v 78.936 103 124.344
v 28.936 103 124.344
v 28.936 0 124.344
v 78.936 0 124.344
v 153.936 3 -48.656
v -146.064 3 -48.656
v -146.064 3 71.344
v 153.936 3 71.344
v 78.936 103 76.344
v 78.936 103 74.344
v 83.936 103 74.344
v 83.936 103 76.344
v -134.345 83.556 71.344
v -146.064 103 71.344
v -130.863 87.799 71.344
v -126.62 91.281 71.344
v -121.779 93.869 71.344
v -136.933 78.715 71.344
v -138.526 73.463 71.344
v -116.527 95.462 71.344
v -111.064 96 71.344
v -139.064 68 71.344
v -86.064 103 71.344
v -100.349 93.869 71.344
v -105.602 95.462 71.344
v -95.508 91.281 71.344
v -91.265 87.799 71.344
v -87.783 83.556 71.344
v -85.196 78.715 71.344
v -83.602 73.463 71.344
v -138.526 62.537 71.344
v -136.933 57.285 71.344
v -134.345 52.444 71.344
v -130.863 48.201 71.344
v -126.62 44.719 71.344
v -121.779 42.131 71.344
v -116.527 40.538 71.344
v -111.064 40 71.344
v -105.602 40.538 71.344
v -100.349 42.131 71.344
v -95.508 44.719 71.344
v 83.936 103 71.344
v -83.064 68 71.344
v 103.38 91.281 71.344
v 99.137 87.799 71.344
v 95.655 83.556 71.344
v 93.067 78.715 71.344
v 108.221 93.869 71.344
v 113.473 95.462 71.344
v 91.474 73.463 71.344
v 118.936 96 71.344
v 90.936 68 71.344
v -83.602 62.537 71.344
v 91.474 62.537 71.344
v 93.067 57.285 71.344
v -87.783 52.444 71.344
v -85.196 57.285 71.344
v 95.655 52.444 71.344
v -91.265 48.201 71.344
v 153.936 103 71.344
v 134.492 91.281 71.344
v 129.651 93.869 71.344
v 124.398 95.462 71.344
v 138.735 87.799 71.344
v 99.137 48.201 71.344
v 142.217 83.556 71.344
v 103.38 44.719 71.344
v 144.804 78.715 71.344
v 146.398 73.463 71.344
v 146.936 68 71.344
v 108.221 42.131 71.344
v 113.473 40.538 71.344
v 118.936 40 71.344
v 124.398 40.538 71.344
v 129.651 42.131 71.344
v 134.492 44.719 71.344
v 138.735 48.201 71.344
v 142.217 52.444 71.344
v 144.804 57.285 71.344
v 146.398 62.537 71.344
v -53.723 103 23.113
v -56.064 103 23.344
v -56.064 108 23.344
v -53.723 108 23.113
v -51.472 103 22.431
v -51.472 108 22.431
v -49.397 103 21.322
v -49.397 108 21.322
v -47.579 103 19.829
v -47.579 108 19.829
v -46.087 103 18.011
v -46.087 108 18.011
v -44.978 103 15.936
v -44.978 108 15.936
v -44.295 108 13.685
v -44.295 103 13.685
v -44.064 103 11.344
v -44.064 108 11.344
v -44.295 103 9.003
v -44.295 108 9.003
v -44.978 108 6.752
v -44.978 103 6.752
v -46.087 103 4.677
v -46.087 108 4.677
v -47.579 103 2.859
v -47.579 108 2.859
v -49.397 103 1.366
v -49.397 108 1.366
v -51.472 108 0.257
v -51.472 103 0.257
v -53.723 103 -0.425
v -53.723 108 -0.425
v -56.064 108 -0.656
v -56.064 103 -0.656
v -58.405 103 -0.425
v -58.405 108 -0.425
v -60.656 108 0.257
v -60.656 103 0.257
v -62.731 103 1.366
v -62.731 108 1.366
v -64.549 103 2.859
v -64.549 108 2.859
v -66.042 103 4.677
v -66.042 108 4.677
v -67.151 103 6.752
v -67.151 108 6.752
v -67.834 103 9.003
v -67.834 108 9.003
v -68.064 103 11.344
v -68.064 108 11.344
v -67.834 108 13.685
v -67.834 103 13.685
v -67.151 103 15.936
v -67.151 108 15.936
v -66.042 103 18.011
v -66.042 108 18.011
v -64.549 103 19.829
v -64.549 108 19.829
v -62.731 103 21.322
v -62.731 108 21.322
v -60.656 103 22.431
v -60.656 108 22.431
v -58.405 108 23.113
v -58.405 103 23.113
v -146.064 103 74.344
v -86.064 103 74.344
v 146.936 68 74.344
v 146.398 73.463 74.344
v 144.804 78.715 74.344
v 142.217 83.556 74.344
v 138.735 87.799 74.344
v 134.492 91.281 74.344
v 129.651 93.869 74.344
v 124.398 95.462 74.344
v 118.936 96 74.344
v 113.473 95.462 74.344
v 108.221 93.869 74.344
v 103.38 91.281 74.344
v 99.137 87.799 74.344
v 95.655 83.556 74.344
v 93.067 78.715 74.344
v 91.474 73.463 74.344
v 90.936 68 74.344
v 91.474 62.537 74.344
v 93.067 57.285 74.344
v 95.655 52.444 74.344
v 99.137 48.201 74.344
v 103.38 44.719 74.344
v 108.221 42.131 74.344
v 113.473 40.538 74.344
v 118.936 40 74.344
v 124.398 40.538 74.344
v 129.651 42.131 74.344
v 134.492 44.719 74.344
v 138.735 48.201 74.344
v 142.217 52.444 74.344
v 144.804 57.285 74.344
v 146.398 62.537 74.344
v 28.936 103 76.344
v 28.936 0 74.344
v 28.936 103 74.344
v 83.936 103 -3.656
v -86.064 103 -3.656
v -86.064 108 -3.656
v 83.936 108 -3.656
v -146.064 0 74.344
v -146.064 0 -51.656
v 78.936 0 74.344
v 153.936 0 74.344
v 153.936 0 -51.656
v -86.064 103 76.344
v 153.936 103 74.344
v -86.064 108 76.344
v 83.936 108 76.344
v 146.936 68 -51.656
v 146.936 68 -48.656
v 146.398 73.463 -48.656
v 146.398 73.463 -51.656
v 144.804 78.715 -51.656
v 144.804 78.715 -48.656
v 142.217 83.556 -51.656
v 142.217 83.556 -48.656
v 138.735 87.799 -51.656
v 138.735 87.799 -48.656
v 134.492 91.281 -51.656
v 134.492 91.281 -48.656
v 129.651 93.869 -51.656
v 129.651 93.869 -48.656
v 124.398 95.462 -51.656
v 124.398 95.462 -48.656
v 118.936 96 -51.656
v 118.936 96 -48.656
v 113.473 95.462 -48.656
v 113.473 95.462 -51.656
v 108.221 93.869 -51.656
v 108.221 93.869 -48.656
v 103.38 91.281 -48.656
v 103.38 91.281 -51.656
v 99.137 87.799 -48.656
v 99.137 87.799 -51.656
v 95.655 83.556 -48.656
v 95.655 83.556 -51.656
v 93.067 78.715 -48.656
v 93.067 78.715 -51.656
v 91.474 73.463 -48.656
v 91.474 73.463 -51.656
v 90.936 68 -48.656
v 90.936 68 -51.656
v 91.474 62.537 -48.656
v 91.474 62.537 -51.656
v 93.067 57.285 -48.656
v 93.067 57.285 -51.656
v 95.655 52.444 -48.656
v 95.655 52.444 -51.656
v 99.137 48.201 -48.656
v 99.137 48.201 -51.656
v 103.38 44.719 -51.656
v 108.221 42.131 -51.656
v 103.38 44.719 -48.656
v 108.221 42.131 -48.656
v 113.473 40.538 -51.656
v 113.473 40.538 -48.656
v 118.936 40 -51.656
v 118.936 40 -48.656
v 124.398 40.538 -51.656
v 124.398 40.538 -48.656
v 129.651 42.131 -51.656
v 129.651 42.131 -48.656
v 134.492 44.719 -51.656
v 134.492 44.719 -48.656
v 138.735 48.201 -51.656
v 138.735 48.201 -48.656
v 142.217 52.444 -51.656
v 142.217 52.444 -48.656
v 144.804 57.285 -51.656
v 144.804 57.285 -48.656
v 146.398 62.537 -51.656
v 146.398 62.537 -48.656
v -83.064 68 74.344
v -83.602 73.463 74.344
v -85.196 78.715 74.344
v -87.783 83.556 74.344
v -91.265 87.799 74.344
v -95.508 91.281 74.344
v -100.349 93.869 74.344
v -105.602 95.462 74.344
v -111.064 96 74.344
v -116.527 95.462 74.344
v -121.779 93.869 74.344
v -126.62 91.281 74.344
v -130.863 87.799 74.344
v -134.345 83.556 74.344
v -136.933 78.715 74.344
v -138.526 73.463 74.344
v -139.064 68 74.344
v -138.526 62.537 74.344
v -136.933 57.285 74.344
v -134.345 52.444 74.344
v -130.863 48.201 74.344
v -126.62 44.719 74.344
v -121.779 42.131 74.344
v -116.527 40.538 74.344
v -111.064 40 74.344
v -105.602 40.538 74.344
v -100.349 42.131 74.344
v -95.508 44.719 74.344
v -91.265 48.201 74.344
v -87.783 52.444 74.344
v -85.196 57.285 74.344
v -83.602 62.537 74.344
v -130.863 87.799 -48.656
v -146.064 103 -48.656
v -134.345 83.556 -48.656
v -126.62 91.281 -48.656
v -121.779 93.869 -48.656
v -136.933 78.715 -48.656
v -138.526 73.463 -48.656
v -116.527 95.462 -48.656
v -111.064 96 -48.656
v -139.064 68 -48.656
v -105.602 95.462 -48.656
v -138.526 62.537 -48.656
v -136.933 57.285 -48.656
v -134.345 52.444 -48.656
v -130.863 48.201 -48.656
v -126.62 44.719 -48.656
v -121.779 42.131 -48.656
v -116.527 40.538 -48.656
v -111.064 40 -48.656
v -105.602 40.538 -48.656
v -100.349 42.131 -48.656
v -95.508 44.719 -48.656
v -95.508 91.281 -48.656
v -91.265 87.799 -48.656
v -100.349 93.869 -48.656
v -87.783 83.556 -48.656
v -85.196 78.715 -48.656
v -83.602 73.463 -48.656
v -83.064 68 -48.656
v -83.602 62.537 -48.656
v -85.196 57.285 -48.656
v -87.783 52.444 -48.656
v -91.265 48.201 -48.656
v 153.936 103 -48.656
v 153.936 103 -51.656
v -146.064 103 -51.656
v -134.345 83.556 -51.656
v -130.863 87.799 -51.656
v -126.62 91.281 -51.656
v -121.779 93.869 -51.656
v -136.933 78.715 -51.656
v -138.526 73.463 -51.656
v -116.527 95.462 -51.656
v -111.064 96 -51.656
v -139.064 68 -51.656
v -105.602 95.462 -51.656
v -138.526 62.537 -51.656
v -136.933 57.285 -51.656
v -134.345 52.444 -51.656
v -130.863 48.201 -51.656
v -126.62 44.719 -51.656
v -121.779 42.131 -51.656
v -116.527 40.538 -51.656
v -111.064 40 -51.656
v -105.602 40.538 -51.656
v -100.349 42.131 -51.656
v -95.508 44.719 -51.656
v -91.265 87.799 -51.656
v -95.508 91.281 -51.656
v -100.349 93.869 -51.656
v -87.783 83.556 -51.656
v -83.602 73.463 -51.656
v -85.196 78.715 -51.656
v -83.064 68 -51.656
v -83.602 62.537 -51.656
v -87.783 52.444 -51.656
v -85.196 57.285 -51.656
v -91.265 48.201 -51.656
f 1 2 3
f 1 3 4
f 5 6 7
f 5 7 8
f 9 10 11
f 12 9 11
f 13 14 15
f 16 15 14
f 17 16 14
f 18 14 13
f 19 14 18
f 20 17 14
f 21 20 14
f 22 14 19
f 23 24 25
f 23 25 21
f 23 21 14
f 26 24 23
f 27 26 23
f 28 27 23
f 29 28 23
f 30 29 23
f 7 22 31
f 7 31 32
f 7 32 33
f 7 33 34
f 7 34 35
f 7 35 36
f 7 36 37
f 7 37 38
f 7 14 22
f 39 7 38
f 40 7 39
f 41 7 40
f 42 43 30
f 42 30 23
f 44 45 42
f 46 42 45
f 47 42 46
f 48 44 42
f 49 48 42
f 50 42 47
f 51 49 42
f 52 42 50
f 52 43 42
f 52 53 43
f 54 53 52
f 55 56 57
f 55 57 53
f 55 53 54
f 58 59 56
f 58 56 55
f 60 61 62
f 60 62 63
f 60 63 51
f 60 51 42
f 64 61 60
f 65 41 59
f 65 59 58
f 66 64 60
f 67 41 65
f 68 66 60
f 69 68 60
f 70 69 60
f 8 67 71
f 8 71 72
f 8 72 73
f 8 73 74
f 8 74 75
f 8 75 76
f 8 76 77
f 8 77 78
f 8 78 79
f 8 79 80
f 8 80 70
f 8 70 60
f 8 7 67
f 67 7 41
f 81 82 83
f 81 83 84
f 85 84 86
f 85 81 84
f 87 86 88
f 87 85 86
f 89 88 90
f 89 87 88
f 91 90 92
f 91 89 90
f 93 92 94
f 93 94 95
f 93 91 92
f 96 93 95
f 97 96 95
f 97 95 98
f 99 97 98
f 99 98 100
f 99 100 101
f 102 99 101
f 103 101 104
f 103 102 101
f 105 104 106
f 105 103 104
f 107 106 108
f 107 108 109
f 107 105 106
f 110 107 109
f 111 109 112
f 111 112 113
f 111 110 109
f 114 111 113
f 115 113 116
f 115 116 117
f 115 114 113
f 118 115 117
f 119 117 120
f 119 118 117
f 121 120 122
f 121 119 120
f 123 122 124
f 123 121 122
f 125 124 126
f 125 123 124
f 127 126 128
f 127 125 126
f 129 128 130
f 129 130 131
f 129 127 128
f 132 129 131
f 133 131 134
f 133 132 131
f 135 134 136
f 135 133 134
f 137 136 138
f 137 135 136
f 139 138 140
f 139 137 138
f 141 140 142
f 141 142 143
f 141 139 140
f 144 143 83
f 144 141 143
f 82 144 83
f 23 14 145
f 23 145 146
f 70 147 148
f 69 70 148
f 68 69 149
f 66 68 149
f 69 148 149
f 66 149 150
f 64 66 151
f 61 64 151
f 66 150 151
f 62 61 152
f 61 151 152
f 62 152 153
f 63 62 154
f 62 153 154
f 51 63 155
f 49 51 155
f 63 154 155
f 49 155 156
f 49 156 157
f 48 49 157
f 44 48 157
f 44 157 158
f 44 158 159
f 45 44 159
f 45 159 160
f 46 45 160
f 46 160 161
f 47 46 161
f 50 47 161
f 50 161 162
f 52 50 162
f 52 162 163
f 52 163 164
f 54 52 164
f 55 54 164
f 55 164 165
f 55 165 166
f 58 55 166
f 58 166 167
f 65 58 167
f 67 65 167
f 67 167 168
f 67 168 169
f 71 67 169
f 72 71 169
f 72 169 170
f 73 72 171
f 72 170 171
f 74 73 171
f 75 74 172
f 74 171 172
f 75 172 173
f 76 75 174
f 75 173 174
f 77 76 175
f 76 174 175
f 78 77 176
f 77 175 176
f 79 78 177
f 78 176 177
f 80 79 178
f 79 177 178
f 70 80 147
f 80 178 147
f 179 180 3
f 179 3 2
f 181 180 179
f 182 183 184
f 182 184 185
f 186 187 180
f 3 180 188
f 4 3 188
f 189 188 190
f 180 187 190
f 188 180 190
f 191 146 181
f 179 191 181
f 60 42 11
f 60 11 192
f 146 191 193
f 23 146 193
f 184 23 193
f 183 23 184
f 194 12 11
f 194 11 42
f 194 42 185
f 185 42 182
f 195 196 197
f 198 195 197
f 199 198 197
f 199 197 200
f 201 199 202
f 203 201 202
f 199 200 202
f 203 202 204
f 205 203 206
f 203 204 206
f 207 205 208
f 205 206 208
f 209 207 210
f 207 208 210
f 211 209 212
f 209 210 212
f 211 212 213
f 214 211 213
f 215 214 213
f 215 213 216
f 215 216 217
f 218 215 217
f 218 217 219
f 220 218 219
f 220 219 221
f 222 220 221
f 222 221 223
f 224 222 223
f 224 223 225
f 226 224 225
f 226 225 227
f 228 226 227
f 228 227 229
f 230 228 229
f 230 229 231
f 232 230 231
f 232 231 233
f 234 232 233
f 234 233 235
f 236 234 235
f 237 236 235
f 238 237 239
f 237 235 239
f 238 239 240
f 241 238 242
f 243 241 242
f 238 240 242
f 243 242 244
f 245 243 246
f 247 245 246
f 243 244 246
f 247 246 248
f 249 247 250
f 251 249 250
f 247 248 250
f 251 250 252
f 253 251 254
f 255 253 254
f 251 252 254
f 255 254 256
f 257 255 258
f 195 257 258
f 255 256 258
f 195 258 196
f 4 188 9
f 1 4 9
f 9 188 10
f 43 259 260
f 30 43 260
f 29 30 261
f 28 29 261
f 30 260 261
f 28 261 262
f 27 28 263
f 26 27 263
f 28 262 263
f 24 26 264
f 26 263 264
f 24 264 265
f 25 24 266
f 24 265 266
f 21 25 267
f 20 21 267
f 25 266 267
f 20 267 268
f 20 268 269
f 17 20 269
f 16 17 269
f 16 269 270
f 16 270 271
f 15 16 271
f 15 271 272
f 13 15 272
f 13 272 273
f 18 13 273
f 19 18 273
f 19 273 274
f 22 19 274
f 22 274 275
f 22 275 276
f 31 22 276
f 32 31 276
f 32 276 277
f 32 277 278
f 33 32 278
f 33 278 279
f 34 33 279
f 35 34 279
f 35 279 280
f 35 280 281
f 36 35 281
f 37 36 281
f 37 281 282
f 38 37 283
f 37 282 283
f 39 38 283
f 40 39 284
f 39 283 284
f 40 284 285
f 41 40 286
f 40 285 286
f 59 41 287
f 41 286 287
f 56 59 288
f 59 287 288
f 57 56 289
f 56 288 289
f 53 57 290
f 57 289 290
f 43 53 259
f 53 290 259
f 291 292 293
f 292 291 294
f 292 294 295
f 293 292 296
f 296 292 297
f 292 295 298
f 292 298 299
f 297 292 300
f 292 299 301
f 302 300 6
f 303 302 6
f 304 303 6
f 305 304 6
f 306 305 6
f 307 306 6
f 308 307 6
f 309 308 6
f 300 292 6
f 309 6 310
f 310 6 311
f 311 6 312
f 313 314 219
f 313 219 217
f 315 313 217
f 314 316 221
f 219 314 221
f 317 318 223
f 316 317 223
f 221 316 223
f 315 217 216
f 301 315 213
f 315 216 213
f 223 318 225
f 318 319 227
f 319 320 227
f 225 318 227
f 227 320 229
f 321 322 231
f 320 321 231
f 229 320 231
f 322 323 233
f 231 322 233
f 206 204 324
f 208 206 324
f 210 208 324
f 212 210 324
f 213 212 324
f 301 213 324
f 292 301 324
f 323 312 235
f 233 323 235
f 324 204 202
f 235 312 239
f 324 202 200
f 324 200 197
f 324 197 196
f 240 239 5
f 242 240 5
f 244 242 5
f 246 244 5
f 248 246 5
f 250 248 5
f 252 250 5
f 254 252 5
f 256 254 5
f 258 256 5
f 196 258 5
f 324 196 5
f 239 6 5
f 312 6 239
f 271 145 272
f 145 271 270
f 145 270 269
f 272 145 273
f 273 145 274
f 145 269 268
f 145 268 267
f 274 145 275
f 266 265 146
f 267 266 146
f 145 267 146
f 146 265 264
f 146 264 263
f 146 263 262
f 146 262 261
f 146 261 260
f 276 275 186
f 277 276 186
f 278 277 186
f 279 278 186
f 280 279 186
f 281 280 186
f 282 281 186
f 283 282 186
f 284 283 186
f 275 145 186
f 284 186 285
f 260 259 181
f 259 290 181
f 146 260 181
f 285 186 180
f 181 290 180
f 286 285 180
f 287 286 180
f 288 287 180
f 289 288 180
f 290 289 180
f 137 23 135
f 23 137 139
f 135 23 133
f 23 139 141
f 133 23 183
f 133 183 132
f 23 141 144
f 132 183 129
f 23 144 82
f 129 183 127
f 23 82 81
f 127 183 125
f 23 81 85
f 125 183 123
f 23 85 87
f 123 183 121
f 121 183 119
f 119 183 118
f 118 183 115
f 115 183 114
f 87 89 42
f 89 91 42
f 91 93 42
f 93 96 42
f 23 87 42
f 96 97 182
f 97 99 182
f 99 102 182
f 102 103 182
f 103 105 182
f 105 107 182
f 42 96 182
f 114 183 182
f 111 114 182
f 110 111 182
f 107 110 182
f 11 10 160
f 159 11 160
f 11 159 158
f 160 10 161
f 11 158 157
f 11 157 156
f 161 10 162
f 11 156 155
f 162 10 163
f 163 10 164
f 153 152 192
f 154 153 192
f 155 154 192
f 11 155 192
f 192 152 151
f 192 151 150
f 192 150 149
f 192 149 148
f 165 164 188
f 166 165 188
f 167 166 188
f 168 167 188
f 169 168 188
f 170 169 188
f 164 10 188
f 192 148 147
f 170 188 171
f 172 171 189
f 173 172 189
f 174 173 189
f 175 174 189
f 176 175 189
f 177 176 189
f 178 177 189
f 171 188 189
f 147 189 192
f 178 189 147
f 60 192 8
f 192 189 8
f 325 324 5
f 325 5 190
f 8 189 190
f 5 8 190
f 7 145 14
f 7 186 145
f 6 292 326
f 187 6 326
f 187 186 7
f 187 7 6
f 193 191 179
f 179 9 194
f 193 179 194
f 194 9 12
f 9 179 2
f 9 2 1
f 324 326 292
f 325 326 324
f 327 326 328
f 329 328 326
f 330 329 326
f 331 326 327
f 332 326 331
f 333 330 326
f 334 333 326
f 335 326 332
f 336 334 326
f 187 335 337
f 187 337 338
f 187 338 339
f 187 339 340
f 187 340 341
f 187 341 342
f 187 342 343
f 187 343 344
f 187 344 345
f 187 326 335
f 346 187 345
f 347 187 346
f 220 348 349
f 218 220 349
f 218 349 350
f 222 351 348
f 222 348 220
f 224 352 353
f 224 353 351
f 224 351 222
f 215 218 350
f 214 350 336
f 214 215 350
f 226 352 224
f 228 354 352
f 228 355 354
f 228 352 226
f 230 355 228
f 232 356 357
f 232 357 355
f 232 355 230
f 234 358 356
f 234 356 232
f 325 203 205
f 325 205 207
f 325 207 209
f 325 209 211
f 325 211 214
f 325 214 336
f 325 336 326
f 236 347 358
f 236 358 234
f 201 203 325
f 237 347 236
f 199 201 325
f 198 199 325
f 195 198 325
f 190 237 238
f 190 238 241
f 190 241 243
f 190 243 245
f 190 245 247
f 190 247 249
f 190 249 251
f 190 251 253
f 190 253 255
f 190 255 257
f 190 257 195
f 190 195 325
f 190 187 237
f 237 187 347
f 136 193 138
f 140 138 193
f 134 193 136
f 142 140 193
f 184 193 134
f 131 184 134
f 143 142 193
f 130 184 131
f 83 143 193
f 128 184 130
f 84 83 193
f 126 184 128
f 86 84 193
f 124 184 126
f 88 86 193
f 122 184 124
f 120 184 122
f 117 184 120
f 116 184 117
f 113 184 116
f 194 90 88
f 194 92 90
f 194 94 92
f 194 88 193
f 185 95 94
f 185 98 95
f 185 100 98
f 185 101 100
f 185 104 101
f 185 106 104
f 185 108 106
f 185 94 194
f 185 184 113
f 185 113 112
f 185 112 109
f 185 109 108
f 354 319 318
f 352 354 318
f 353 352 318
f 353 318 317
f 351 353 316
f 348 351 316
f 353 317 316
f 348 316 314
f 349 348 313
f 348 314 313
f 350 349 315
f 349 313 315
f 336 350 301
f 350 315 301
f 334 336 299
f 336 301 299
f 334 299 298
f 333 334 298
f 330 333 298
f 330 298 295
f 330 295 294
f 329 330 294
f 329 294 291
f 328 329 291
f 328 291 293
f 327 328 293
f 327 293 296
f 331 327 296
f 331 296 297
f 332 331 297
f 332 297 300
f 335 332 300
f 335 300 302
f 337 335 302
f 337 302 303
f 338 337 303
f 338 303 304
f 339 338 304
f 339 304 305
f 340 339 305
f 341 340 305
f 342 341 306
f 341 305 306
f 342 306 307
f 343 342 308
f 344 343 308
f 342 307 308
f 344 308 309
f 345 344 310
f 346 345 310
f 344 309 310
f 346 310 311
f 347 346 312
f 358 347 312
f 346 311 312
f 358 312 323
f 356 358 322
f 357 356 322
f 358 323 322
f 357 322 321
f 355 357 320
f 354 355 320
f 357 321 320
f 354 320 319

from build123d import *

# Parameters (mm, degrees)
SKETCH1_W            = 300
SKETCH1_H            = 126
BOSS_EXTRUDE2_DEPTH  = 3
SKETCH3_W            = 300
SKETCH3_H            = 3
BOSS_EXTRUDE3_DEPTH  = 100
SKETCH4_R            = 28
CUT_EXTRUDE1_DEPTH   = 186
SKETCH5_W            = 50
SKETCH5_H            = 103
BOSS_EXTRUDE9_DEPTH  = 50
SKETCH9_W            = 170
SKETCH9_H            = 80
SKETCH9_R            = 12
BOSS_EXTRUDE14_DEPTH = 5


with BuildPart() as part:
    # Sketch1 → Boss-Extrude2 (new body)
    with BuildSketch(Plane(origin=(0, 0, 0), x_dir=(1, 0, 0), z_dir=(0, 1, 0))):
        with Locations((3.935860058, -11.344023324)):
            Rectangle(SKETCH1_W, SKETCH1_H)
    extrude(amount=BOSS_EXTRUDE2_DEPTH)

    # Sketch3 → Boss-Extrude3 (add)
    with BuildSketch(Plane(origin=(0, 3, 0), x_dir=(1, 0, 0), z_dir=(0, 1, 0))):
        with Locations((3.935860058, -72.844023324)):
            Rectangle(SKETCH3_W, SKETCH3_H)
        with Locations((3.935860058, 50.155976676)):
            Rectangle(SKETCH3_W, SKETCH3_H)
    extrude(amount=BOSS_EXTRUDE3_DEPTH)

    # Sketch4 → Cut-Extrude1 (cut)
    with BuildSketch(Plane.XY.offset(74.344023324)):
        with Locations((-111.064139942, 68)):
            Circle(SKETCH4_R)
        with Locations((118.935860058, 68)):
            Circle(SKETCH4_R)
    extrude(amount=-CUT_EXTRUDE1_DEPTH, mode=Mode.SUBTRACT)

    # Sketch5 → Boss-Extrude9 (add)
    with BuildSketch(Plane.XY.offset(74.344023324)):
        with Locations((53.935860058, 51.5)):
            Rectangle(SKETCH5_W, SKETCH5_H)
    extrude(amount=BOSS_EXTRUDE9_DEPTH)

    # Sketch9 → Boss-Extrude14 (add)
    with BuildSketch(Plane(origin=(0, 103, 0), x_dir=(1, 0, 0), z_dir=(0, 1, 0))):
        with Locations((-1.064139942, -36.344023324)):
            Rectangle(SKETCH9_W, SKETCH9_H)
        with Locations(Location((-56.064139942, -11.344023324, 0), (0, 0, 270))):
            Circle(SKETCH9_R, mode=Mode.SUBTRACT)
    extrude(amount=BOSS_EXTRUDE14_DEPTH)


solid = part.part
